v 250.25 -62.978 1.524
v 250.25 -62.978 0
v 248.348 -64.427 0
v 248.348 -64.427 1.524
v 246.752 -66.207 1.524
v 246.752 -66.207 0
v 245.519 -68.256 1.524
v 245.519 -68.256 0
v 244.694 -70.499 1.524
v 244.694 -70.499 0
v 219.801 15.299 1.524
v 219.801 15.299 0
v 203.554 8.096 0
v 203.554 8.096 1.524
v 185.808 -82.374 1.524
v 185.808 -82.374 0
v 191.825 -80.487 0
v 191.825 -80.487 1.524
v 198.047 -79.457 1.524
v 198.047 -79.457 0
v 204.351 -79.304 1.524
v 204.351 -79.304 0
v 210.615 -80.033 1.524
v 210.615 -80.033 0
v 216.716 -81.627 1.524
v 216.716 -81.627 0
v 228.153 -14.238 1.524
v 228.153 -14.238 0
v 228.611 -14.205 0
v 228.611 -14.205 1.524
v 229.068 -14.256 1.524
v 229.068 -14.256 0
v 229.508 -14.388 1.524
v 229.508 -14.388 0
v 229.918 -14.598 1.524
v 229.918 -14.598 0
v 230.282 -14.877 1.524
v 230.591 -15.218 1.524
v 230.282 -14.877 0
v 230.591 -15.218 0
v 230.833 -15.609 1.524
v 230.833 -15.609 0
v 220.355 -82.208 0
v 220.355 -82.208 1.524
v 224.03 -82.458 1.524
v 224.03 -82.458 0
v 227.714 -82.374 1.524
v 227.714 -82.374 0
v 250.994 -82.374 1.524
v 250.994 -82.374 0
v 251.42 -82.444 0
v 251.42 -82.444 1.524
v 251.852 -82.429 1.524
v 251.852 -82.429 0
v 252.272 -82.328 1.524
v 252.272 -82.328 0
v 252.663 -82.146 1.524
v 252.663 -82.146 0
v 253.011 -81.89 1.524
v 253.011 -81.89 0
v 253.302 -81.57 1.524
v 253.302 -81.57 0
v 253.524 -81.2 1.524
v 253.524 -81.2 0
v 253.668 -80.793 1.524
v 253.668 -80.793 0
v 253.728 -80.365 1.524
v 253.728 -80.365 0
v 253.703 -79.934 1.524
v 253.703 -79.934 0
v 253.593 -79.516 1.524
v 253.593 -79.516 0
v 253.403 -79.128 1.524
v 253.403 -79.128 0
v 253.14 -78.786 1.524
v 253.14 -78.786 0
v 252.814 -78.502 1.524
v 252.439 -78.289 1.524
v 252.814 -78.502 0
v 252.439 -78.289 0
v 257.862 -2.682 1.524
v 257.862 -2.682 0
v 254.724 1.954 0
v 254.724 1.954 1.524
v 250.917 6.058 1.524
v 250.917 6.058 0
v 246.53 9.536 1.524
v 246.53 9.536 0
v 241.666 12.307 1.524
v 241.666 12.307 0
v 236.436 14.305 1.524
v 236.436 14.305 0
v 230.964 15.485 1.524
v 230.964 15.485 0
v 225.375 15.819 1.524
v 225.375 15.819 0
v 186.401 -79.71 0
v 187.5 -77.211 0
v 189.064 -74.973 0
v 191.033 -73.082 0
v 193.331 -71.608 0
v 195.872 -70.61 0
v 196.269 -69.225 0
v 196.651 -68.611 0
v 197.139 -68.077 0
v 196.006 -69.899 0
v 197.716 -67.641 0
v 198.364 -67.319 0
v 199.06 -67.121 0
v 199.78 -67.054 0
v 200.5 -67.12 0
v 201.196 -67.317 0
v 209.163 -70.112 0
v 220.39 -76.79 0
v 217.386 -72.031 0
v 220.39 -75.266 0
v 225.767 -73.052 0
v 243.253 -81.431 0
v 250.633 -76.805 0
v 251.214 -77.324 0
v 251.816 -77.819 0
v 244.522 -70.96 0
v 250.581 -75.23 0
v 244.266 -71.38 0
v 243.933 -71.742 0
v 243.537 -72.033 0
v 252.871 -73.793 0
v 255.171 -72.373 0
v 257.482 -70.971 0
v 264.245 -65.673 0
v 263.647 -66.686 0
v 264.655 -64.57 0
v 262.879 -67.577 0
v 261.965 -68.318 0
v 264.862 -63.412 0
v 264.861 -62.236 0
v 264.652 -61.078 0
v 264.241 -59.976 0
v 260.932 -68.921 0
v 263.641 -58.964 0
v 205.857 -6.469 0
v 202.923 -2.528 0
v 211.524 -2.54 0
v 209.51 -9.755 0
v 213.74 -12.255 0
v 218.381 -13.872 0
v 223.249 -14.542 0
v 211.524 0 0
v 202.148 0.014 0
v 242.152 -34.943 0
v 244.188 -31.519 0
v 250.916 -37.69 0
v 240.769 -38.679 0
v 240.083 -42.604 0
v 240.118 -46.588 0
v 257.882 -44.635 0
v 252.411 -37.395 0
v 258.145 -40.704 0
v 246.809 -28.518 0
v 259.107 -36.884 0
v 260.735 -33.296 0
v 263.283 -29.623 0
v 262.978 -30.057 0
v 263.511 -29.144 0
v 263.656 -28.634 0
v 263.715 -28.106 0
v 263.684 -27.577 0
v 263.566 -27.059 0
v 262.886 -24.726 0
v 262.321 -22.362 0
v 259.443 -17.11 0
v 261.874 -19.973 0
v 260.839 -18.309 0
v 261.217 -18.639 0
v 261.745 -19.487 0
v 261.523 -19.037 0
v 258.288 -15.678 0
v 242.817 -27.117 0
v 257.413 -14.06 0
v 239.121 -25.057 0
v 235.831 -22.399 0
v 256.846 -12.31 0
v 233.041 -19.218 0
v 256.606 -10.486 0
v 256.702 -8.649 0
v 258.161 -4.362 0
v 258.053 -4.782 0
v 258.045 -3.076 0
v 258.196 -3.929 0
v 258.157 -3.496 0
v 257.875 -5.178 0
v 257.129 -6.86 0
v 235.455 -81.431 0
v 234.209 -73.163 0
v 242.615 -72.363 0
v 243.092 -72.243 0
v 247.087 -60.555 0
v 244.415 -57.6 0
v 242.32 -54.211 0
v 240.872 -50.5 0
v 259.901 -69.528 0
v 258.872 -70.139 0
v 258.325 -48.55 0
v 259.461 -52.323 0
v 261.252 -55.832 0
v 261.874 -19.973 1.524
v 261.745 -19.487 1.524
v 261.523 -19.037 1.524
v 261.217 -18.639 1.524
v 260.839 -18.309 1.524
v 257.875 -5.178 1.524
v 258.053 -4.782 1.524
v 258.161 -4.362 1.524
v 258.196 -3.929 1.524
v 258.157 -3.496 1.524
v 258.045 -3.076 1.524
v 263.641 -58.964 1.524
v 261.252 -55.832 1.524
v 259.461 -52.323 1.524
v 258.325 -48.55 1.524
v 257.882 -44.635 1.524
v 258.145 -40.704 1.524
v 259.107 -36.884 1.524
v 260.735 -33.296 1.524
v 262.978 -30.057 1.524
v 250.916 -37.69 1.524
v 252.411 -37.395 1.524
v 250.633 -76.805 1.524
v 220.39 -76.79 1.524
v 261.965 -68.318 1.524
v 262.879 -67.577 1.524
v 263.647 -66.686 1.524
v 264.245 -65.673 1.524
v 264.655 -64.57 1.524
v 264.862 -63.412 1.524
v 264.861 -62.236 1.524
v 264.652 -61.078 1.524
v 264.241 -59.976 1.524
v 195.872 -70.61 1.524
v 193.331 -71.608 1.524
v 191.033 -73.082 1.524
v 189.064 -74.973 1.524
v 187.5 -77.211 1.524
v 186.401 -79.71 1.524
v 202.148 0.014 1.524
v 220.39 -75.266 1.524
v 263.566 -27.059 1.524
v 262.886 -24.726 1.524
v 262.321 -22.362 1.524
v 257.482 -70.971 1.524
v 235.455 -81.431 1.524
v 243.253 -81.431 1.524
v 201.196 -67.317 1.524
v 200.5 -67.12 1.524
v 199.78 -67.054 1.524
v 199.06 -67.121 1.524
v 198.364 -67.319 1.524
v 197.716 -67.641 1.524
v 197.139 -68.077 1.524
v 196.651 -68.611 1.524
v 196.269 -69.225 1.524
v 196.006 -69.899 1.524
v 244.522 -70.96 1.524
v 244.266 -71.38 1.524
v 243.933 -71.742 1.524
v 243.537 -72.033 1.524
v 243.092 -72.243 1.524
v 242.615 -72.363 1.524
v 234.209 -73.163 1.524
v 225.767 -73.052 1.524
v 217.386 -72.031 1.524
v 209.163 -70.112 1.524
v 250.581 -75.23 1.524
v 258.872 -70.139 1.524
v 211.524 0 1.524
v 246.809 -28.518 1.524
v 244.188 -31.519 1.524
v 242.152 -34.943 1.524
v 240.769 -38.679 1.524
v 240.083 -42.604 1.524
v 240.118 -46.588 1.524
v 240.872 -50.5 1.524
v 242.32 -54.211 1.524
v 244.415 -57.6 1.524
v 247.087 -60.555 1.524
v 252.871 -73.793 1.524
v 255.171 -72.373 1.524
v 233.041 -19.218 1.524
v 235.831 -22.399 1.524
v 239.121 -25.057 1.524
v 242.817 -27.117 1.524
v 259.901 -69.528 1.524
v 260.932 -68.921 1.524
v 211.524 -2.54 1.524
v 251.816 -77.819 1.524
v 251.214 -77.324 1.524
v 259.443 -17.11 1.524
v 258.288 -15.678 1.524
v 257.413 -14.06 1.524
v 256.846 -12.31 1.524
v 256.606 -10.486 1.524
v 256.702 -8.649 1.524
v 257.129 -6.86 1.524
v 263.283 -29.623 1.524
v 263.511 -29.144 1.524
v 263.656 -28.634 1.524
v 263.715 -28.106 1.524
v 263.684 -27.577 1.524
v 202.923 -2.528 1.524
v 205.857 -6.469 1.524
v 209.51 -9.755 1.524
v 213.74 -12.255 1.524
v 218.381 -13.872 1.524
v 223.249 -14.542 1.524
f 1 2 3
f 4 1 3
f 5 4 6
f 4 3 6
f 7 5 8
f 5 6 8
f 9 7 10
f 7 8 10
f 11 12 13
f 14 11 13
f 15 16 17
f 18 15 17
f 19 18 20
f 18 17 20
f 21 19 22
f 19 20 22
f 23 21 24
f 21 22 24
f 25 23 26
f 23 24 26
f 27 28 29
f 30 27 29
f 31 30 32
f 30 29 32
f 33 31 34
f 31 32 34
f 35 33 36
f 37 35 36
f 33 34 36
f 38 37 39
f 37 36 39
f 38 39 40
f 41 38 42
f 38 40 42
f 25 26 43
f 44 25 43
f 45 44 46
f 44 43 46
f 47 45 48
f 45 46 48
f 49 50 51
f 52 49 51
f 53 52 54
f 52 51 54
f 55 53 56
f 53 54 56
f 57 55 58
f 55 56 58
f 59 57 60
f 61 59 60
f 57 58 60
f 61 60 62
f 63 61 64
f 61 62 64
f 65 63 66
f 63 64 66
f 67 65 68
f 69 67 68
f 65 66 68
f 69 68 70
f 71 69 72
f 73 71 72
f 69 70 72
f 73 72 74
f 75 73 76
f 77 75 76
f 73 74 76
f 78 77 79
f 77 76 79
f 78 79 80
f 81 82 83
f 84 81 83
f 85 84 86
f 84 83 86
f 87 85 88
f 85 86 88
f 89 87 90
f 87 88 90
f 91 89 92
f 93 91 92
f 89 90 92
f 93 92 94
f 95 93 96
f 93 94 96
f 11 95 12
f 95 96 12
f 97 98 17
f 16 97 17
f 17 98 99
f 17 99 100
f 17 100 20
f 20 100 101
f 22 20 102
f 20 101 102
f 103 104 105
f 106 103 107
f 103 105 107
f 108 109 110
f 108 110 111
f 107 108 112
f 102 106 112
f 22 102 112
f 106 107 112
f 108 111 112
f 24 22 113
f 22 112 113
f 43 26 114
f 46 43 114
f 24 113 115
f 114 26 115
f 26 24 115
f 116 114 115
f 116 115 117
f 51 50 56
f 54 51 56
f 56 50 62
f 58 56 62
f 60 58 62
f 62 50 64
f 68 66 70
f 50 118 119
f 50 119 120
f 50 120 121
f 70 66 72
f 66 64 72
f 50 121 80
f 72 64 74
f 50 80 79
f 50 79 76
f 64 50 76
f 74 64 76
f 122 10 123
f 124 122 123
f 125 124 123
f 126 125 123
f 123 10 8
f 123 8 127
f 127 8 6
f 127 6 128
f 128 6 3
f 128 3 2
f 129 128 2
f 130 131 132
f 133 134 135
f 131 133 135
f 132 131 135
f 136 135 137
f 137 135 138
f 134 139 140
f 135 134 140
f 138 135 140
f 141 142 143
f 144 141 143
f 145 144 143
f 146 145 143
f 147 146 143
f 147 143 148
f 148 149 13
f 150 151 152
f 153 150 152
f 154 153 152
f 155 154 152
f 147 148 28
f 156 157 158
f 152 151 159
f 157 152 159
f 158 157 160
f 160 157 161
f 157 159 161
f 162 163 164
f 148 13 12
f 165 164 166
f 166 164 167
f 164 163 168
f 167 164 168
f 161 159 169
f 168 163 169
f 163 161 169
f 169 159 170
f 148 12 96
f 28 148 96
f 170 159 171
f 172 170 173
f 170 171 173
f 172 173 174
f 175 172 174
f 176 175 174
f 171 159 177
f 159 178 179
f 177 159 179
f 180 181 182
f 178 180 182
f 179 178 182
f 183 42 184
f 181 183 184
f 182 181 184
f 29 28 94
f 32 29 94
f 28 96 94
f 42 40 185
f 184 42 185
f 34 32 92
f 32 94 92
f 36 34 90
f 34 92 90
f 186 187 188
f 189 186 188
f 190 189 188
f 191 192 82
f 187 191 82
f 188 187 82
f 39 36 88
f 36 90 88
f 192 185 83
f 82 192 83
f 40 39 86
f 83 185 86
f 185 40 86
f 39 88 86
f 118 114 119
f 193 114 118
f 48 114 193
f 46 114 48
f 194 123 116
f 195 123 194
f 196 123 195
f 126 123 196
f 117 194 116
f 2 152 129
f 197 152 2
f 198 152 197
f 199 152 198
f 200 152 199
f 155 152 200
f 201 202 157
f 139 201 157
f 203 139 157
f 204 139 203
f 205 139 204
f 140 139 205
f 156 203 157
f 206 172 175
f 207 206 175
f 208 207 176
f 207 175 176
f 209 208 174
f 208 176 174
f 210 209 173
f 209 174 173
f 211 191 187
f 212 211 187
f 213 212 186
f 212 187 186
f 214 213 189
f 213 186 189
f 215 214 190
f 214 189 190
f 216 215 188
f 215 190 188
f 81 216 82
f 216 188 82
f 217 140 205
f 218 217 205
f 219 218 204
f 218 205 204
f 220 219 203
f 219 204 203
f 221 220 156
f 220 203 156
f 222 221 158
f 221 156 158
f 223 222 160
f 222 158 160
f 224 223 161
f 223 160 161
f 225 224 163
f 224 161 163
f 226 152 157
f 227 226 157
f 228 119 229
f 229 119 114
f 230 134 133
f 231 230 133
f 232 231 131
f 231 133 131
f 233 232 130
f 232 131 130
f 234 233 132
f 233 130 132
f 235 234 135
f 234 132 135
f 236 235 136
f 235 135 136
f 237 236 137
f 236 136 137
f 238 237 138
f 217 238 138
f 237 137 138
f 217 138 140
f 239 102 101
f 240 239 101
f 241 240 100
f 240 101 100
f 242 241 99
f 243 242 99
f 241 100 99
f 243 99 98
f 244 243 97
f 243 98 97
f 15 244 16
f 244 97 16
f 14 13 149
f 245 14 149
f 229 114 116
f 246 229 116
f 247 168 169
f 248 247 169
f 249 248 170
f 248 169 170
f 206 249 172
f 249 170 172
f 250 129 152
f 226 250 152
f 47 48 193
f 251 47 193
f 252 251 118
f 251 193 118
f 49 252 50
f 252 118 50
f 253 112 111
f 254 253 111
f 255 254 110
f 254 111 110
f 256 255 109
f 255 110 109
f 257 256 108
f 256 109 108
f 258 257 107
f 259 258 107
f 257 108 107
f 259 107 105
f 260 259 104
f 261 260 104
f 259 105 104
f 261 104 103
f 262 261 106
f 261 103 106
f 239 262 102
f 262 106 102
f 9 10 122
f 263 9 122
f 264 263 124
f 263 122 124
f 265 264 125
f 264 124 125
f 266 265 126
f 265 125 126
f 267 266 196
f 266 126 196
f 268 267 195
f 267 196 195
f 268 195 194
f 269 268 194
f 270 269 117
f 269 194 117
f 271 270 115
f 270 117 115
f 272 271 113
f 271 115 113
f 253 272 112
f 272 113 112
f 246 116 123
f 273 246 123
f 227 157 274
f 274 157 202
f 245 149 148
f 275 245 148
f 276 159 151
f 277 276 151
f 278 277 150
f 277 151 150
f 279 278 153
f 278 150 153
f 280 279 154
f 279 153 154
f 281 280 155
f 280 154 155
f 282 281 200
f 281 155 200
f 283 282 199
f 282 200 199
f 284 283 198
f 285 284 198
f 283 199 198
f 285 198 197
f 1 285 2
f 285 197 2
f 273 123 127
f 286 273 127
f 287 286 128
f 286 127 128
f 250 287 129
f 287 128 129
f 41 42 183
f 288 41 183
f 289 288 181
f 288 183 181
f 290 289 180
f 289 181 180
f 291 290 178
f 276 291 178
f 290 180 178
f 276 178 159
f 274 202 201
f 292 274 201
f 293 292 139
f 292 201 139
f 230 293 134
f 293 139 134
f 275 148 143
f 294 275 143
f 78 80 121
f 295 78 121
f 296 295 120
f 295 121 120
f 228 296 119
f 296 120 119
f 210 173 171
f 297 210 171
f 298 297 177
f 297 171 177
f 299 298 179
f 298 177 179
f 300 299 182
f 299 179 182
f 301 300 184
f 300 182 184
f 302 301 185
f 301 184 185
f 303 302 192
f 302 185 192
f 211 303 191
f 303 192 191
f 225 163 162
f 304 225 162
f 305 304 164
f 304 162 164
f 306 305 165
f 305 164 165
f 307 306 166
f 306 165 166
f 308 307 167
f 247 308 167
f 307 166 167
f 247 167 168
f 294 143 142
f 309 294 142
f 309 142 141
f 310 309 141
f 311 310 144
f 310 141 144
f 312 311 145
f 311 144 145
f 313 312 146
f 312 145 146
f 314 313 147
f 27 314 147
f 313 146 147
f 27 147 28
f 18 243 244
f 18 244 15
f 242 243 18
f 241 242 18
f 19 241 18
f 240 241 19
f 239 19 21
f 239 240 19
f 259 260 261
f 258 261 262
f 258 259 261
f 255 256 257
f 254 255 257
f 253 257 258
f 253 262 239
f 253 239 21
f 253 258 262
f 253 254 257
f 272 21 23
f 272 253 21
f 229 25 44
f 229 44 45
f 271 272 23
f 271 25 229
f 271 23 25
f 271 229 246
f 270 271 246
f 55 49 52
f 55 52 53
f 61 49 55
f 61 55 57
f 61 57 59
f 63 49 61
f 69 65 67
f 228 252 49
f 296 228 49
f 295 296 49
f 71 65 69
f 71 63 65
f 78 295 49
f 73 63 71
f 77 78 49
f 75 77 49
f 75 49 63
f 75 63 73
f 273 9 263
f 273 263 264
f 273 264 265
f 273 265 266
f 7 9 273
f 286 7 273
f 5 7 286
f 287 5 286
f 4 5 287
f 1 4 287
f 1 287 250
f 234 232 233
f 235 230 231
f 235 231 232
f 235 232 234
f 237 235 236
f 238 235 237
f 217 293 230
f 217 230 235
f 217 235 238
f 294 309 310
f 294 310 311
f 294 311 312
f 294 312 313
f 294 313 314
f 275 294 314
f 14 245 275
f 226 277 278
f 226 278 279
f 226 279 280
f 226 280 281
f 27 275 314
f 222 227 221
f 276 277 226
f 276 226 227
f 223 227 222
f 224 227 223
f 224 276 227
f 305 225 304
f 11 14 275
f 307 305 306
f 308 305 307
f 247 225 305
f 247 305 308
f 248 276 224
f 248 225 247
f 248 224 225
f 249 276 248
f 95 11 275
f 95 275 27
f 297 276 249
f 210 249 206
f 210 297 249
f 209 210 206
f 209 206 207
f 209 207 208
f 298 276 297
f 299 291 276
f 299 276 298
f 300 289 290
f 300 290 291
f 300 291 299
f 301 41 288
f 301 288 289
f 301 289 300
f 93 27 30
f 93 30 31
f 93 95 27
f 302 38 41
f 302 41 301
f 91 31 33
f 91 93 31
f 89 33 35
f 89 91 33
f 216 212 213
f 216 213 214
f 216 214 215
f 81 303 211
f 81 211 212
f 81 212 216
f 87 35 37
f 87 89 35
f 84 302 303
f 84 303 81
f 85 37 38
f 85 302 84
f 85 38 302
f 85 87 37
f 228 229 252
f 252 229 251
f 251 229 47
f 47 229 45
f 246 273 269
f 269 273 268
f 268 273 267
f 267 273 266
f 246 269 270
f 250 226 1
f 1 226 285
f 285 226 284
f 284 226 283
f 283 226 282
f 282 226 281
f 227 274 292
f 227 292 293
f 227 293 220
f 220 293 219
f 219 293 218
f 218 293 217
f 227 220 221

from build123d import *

# Parameters (mm, degrees)
BOSS_EXTRUDE1_DEPTH = 1.524


with BuildPart() as part:
    # Sketch1 → Boss-Extrude1 (new body)
    with BuildSketch(Plane.XY):
        with BuildLine():
            Line((211.523731391, 0), (211.523731391, -2.54))
            Line((211.523731391, -2.54), (202.922883793, -2.527561419))
            ThreePointArc((202.922883793, -2.527561419), (213.740389033, -12.255488314), (228.152940708, -14.237743463))
            ThreePointArc((228.152940708, -14.237743463), (229.717824369, -14.48375454), (230.832595731, -15.609217614))
            ThreePointArc((230.832595731, -15.609217614), (237.419060845, -23.79840587), (246.808881255, -28.518109213))
            ThreePointArc((246.808881255, -28.518109213), (240.118021125, -46.587905071), (250.249852394, -62.977875381))
            ThreePointArc((250.249852394, -62.977875381), (246.752221114, -66.207121421), (244.693512184, -70.499343702))
            ThreePointArc((244.693512184, -70.499343702), (243.933055031, -71.742181277), (242.614733859, -72.362640469))
            ThreePointArc((242.614733859, -72.362640469), (221.562461662, -72.654811524), (201.196110579, -67.316715223))
            ThreePointArc((201.196110579, -67.316715223), (197.716188185, -67.641087637), (195.87163248, -70.609705427))
            ThreePointArc((195.87163248, -70.609705427), (189.064028536, -74.973109583), (185.80791446, -82.374493805))
            ThreePointArc((185.80791446, -82.374493805), (201.196110579, -79.270242267), (216.71630717, -81.627455706))
            ThreePointArc((216.71630717, -81.627455706), (222.189556026, -82.374432464), (227.713542567, -82.374493805))
            ThreePointArc((227.713542567, -82.374493805), (239.353709896, -81.313035156), (250.993877225, -82.374493805))
            ThreePointArc((250.993877225, -82.374493805), (253.605845534, -80.999769877), (252.438715023, -78.288672185))
            ThreePointArc((252.438715023, -78.288672185), (251.512482649, -77.574775104), (250.632502883, -76.804586124))
            Line((250.632502883, -76.804586124), (220.3898048, -76.789947691))
            Line((220.3898048, -76.789947691), (220.3898048, -75.265947691))
            Line((220.3898048, -75.265947691), (250.581391322, -75.229531899))
            ThreePointArc((250.581391322, -75.229531899), (254.019892125, -73.080630034), (257.482403047, -70.97063356))
            Line((257.482403047, -70.97063356), (250.916170957, -37.690058187))
            Line((250.916170957, -37.690058187), (252.411347424, -37.395061012))
            Line((252.411347424, -37.395061012), (258.871697415, -70.138978964))
            ThreePointArc((258.871697415, -70.138978964), (260.416031898, -69.224443913), (261.964911432, -68.317627754))
            ThreePointArc((261.964911432, -68.317627754), (264.784241837, -63.996035266), (263.641101809, -58.964334117))
            ThreePointArc((263.641101809, -58.964334117), (257.882003246, -44.635324676), (262.978270283, -30.057403353))
            ThreePointArc((262.978270283, -30.057403353), (263.656491571, -28.633675993), (263.566043061, -27.059254582))
            ThreePointArc((263.566043061, -27.059254582), (262.588823269, -23.547314792), (261.873711132, -19.972780664))
            ThreePointArc((261.873711132, -19.972780664), (261.52305104, -19.036925788), (260.838506947, -18.308786906))
            ThreePointArc((260.838506947, -18.308786906), (256.845813142, -12.310330809), (257.874930037, -5.178430798))
            ThreePointArc((257.874930037, -5.178430798), (258.196394426, -3.928637169), (257.862228141, -2.682179643))
            ThreePointArc((257.862228141, -2.682179643), (241.665574941, 12.306611524), (219.801437593, 15.299091023))
            Line((219.801437593, 15.299091023), (203.553625304, 8.095778667))
            Line((203.553625304, 8.095778667), (202.1481549, 0.013558997))
            Line((202.1481549, 0.013558997), (211.523731391, 0))
        make_face()
    extrude(amount=BOSS_EXTRUDE1_DEPTH)


solid = part.part
